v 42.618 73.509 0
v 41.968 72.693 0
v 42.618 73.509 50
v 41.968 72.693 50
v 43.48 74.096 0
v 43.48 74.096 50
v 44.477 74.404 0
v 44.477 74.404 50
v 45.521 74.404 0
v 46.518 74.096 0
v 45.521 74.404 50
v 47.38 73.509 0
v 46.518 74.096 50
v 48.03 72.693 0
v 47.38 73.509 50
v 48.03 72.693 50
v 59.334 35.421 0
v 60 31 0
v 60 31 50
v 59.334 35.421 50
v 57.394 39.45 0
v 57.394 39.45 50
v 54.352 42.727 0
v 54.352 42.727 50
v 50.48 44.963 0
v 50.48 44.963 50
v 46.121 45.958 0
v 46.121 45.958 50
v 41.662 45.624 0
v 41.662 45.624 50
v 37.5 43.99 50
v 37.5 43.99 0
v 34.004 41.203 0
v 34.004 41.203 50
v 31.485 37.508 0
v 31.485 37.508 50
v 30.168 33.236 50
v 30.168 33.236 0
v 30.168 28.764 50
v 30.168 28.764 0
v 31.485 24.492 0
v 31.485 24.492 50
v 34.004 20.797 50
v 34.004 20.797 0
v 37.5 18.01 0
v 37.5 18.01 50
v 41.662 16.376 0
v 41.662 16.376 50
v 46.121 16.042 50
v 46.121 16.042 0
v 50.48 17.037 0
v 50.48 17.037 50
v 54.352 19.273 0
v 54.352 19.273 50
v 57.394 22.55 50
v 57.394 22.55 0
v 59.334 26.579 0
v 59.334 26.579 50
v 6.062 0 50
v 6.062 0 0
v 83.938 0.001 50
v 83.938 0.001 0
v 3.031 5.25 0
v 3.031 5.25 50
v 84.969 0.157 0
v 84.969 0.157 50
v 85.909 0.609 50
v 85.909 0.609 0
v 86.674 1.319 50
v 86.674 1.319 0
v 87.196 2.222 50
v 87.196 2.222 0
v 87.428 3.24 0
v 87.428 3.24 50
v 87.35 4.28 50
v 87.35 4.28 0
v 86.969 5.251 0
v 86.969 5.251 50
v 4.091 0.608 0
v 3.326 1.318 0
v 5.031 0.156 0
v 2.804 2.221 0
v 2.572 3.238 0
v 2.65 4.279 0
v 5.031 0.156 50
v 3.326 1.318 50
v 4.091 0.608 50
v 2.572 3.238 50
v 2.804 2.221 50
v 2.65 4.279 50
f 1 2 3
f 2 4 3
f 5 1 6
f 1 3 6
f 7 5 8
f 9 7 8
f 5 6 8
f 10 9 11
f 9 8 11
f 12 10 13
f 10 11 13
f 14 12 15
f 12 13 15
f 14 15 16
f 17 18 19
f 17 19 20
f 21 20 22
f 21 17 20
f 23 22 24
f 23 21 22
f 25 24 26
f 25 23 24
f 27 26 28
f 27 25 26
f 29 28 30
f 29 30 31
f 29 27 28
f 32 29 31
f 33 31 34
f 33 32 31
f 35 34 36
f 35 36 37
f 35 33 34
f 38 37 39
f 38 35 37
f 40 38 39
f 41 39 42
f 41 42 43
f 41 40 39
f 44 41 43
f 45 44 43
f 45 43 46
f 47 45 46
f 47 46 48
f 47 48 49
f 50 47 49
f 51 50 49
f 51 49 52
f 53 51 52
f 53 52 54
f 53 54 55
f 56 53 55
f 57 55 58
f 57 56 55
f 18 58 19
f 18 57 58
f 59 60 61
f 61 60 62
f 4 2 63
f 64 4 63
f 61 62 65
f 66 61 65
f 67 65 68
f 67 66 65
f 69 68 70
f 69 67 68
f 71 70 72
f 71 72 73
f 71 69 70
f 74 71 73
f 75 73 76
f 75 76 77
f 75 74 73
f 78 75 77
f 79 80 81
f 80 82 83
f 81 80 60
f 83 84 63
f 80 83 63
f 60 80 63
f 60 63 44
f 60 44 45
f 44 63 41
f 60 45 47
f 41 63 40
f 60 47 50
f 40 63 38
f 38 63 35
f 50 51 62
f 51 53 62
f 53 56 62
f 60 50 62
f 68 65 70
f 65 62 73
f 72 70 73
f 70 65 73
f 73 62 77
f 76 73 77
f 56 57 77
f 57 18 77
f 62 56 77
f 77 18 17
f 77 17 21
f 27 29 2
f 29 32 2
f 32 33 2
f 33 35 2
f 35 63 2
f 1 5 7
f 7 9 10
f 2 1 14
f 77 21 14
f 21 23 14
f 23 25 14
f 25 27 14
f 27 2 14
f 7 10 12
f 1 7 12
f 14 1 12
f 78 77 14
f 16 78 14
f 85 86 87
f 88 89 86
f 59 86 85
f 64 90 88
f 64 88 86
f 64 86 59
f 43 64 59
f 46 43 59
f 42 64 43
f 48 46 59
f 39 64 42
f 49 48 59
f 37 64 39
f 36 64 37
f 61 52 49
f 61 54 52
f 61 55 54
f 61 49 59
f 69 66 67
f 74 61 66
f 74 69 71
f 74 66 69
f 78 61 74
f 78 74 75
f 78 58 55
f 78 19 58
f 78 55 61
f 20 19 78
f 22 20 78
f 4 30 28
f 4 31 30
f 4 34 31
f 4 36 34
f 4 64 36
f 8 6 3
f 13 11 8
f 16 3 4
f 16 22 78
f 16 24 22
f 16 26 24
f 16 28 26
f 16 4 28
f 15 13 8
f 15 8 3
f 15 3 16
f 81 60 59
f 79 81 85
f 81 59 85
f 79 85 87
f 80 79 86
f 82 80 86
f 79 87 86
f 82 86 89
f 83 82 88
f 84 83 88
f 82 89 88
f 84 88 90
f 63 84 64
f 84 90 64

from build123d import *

# Parameters (mm, degrees)
SKETCH1_R           = 15
BOSS_EXTRUDE2_DEPTH = 50
FILLET1_R           = 3.5
FILLET2_R           = 3.5
FILLET3_R           = 3.5


with BuildPart() as part:
    # Sketch1 → Boss-Extrude2 (new body)
    with BuildSketch(Plane.XY):
        Polygon((0, 0), (89.999999993, 0.001126334), (44.999024562, 77.942849502), align=None)
        with Locations((45, 31)):
            Circle(SKETCH1_R, mode=Mode.SUBTRACT)
    extrude(amount=BOSS_EXTRUDE2_DEPTH)

    # Fillet1
    fillet1_edges = [part.edges().sort_by_distance(p)[0] for p in [
        (44.999024562, 77.942849502, 25),
    ]]
    fillet(fillet1_edges, radius=FILLET1_R)

    # Fillet2
    fillet2_edges = [part.edges().sort_by_distance(p)[0] for p in [
        (89.999999993, 0.001126334, 25),
    ]]
    fillet(fillet2_edges, radius=FILLET2_R)

    # Fillet3
    fillet3_edges = [part.edges().sort_by_distance(p)[0] for p in [
        (0, 0, 25),
    ]]
    fillet(fillet3_edges, radius=FILLET3_R)


solid = part.part
